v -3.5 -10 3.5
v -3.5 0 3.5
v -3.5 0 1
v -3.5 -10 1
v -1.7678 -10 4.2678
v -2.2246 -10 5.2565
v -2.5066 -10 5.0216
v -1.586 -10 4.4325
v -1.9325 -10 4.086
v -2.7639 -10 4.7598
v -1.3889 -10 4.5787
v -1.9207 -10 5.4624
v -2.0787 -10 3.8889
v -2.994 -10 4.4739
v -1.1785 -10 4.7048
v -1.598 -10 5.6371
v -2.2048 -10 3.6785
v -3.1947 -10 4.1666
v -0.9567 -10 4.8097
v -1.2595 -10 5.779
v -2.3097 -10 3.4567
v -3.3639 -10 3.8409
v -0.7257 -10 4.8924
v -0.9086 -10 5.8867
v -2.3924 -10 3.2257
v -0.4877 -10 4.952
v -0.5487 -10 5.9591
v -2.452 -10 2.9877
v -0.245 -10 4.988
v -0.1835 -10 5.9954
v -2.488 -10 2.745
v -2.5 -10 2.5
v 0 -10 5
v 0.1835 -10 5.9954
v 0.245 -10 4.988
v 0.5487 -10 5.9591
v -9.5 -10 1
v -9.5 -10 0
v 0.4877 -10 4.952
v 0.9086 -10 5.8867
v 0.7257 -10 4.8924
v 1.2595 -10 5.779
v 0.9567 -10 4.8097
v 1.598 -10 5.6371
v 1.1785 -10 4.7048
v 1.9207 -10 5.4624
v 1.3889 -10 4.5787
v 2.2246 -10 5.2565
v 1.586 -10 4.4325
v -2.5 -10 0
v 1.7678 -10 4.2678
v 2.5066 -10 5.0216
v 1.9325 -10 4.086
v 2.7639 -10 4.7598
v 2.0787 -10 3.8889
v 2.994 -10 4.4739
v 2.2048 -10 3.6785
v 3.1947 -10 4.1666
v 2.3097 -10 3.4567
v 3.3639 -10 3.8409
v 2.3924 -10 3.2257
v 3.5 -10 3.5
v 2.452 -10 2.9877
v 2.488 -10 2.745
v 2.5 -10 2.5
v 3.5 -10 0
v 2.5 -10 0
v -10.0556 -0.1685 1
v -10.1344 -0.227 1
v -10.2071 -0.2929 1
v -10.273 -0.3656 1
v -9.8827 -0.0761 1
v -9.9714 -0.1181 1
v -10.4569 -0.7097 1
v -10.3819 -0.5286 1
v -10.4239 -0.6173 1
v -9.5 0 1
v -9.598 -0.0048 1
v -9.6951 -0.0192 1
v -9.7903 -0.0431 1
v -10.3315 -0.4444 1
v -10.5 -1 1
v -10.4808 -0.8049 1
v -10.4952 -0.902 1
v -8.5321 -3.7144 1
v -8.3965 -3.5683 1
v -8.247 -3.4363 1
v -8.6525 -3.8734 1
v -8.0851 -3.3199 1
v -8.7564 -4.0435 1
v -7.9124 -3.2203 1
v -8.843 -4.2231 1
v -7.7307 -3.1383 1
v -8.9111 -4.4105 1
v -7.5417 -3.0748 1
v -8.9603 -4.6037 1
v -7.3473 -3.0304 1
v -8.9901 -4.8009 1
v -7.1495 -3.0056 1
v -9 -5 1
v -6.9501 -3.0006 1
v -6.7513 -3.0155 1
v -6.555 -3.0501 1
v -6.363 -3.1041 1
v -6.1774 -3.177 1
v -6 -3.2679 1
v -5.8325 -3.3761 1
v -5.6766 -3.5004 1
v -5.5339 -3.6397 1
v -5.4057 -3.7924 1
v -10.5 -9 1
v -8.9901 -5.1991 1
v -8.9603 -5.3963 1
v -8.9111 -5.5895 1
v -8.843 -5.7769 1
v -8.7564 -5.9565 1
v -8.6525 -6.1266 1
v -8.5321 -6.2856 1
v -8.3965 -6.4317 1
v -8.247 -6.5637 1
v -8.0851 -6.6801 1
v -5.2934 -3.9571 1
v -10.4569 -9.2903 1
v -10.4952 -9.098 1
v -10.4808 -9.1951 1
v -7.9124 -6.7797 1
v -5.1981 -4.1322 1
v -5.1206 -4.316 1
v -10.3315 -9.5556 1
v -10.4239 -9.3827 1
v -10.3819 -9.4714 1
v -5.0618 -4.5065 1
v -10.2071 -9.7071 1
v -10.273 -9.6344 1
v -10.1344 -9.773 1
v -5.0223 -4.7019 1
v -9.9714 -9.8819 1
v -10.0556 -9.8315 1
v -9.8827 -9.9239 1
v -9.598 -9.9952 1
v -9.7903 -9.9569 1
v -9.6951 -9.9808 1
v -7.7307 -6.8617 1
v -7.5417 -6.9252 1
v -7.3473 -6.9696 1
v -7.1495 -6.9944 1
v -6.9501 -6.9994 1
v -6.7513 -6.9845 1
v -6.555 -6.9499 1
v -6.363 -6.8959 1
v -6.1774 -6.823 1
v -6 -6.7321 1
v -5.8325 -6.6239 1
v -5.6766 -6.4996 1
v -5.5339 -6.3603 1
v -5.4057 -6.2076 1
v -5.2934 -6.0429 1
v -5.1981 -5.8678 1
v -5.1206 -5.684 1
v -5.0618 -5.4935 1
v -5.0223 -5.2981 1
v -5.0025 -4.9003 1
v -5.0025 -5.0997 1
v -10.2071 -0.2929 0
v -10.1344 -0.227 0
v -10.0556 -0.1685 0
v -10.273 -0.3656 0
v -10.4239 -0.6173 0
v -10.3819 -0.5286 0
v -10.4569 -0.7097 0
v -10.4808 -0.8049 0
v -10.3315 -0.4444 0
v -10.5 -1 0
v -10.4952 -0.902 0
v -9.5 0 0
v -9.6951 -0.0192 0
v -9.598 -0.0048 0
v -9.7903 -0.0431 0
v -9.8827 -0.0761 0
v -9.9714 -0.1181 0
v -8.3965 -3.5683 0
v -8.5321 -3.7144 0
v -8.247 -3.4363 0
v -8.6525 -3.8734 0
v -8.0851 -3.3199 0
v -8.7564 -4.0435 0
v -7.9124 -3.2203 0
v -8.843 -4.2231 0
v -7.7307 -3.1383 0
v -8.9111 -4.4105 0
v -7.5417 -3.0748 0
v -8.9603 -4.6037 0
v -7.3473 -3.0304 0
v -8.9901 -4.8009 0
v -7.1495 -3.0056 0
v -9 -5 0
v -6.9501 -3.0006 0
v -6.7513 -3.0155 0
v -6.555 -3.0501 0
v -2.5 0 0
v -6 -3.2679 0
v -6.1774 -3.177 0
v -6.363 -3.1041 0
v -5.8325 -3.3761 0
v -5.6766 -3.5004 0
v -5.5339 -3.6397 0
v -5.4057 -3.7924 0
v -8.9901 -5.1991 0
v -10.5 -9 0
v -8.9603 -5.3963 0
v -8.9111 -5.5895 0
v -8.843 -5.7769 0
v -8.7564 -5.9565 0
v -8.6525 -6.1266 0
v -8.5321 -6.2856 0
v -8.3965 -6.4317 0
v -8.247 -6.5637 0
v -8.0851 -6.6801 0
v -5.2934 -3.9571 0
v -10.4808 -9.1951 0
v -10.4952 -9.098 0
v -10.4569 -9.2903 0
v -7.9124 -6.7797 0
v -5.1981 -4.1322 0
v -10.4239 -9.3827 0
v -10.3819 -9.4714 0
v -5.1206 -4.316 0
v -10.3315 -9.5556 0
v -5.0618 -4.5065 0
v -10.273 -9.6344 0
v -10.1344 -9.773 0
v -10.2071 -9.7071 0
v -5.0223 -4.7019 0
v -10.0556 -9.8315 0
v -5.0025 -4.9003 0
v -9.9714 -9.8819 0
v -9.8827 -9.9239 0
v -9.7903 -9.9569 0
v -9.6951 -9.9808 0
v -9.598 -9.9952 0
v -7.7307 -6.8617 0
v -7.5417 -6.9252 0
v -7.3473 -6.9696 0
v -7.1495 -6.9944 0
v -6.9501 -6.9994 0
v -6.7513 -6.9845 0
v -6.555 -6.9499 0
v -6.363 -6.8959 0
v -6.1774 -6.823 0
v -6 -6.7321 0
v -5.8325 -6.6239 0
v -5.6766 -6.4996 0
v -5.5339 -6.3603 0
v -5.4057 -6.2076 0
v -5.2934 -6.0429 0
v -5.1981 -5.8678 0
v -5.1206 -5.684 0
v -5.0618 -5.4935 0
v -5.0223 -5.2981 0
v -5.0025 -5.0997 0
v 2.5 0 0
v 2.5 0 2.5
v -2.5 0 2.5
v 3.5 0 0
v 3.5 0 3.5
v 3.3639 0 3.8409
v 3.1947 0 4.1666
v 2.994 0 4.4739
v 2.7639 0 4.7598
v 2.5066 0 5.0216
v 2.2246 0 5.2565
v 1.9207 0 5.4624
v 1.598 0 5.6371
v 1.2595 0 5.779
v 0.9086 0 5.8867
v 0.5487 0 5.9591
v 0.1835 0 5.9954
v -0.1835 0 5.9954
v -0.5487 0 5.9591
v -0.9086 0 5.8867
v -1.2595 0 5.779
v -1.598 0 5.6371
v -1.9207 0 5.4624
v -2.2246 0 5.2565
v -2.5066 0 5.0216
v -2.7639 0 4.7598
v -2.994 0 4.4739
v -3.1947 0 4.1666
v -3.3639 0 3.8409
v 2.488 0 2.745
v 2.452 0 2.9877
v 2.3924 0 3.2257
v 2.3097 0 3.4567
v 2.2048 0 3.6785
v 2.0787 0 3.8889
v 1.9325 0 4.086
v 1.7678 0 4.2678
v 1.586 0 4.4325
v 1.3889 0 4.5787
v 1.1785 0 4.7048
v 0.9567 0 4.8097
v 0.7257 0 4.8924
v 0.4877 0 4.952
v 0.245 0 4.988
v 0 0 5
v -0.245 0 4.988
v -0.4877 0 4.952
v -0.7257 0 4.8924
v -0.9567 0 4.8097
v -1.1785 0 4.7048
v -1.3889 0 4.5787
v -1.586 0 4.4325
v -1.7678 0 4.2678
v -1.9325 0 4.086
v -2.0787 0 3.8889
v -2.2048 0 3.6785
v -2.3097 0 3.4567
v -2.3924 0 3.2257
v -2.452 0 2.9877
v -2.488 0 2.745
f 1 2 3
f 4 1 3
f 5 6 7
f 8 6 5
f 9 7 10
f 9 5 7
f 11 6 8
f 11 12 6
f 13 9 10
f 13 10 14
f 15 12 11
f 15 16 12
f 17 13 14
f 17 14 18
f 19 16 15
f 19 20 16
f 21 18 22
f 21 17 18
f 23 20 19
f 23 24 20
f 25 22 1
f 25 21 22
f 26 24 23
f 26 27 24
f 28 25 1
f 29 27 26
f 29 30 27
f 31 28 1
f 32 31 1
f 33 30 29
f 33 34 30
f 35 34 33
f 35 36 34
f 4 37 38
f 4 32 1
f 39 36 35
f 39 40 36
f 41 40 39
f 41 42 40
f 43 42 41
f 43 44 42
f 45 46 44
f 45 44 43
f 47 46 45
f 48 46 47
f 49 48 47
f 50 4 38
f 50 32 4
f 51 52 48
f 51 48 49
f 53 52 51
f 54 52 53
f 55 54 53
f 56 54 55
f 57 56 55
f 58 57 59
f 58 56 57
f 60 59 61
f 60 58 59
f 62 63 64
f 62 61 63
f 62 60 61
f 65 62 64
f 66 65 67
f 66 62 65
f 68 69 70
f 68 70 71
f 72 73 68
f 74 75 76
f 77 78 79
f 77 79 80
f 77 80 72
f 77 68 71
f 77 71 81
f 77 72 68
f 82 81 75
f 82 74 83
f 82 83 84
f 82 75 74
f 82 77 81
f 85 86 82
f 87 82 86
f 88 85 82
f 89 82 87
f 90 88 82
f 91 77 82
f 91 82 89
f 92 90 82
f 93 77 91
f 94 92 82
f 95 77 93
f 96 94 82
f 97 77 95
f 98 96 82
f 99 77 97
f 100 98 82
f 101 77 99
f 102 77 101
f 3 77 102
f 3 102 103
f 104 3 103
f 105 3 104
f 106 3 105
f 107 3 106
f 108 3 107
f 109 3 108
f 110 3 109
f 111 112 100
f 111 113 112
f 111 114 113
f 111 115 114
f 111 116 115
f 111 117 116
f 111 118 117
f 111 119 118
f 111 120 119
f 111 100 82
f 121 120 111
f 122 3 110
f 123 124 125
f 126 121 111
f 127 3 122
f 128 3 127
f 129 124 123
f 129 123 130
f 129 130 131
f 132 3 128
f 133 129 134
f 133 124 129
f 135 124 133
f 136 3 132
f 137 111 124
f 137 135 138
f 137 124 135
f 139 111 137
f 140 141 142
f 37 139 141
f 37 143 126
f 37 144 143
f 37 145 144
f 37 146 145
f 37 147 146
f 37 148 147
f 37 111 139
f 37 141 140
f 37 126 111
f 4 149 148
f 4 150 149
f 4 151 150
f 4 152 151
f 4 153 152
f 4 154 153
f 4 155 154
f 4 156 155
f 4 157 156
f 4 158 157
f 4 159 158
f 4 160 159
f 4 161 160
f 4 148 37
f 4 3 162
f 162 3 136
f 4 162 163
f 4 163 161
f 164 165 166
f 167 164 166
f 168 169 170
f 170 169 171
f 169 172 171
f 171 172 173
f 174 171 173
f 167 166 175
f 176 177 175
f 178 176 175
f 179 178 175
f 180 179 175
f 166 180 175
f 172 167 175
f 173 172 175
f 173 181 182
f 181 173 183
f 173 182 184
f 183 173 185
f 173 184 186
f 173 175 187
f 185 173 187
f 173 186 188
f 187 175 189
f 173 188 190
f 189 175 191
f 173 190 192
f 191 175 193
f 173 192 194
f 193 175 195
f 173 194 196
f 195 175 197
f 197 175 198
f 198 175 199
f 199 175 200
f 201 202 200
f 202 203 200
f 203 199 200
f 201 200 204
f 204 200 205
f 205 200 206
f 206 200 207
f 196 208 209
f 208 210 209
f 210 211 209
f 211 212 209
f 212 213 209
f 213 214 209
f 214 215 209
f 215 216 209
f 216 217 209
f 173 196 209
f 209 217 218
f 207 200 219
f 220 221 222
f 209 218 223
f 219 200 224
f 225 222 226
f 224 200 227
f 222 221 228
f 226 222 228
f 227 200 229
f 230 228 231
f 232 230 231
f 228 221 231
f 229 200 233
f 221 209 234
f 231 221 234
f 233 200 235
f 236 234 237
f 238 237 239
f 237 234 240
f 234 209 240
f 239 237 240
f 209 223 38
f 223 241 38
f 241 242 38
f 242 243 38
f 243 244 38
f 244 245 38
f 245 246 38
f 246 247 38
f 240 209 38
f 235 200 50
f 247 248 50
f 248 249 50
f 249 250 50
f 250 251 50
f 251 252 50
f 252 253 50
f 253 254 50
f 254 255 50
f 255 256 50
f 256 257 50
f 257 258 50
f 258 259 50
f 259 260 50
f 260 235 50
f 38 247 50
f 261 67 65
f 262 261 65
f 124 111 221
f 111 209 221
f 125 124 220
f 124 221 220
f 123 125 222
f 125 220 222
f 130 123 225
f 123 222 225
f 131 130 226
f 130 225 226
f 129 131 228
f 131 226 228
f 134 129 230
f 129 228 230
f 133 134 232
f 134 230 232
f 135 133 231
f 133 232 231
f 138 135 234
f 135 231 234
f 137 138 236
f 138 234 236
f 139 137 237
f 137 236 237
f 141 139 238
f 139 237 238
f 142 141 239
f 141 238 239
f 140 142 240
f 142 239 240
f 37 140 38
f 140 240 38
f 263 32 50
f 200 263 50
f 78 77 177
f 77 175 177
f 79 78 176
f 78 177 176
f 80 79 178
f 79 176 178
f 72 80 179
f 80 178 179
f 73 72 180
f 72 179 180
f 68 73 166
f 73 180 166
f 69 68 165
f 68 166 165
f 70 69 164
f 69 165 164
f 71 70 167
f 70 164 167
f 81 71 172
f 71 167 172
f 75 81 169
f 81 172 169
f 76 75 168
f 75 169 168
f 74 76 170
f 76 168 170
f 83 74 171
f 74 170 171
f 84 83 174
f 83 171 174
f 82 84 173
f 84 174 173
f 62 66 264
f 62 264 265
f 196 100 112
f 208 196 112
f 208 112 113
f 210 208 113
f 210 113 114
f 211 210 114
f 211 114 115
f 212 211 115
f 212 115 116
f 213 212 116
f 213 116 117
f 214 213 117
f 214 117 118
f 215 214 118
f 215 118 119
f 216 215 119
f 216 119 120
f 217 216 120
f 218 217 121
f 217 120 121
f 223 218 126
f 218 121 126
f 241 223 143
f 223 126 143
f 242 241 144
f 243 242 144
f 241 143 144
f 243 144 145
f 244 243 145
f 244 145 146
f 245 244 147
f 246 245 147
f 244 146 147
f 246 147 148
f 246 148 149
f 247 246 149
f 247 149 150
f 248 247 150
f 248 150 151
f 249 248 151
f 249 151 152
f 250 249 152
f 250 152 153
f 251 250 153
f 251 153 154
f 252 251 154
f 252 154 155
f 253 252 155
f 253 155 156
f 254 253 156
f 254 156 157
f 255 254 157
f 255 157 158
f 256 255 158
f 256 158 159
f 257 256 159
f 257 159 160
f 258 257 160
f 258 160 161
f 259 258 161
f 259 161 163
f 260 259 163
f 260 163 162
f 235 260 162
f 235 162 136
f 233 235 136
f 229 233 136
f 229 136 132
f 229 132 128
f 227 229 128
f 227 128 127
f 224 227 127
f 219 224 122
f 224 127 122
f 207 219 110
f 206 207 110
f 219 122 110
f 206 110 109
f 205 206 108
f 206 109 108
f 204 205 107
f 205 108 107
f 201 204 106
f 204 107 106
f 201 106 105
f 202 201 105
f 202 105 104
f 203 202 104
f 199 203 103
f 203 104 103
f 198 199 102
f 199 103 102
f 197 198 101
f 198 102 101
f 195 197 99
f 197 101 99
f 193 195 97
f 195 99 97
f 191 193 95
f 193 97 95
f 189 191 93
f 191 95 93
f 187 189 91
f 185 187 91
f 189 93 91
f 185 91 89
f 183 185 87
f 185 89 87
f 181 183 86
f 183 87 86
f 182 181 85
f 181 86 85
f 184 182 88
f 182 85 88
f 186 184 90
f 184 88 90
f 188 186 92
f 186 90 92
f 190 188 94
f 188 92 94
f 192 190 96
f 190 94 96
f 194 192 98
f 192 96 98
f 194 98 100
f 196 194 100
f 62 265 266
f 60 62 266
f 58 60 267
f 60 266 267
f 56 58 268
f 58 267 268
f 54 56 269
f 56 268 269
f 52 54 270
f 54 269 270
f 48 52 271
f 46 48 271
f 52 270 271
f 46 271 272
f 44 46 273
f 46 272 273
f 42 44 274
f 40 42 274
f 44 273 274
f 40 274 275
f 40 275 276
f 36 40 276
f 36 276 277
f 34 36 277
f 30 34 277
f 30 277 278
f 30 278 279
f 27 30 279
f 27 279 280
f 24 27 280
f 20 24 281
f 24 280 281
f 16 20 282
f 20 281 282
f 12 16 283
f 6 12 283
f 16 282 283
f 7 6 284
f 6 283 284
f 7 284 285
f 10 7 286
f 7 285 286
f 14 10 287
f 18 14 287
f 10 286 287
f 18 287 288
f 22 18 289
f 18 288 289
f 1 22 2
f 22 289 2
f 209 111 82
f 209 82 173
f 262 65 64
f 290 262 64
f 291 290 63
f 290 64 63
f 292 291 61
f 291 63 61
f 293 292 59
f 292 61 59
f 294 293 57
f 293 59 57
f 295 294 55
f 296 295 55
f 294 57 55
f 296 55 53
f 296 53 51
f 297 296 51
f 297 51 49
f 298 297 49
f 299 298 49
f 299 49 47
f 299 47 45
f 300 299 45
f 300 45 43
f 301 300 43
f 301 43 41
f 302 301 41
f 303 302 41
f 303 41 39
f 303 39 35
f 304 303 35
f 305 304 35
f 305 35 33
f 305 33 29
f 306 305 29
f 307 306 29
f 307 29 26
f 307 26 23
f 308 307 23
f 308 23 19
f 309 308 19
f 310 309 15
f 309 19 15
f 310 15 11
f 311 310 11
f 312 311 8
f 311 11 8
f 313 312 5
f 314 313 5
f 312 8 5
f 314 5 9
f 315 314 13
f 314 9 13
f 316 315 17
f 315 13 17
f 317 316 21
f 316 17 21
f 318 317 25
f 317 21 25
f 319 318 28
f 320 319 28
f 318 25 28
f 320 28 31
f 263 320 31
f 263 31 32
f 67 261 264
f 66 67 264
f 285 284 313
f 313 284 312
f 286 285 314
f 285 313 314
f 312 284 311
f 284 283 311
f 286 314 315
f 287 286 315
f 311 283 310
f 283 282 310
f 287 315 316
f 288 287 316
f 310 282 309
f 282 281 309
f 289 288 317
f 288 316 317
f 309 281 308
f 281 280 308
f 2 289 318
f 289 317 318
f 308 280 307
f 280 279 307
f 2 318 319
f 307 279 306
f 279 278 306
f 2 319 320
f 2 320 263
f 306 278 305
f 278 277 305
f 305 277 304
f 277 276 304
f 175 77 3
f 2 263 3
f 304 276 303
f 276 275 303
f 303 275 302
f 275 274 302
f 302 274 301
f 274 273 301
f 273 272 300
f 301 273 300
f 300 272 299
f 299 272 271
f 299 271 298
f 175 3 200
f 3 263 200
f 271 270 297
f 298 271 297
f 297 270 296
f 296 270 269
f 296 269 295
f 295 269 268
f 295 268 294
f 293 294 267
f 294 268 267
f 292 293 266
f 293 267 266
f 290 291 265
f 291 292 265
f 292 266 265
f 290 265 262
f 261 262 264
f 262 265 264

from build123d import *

# Parameters (mm, degrees)
PAD_DEPTH       = 10
POCKET_DEPTH    = 10.001
SKETCH002_W     = 1
SKETCH002_H     = 10
PAD001_DEPTH    = 7
SKETCH003_R     = 2
POCKET001_DEPTH = 5
FILLET_R        = 1


with BuildPart() as part:
    # Sketch → Pad (new body)
    with BuildSketch(Plane.XZ):
        with BuildLine():
            ThreePointArc((3.5, 3.5), (0, 6), (-3.5, 3.5))
            Line((-3.5, 3.5), (-3.5, 0))
            Line((-3.5, 0), (3.5, 0))
            Line((3.5, 0), (3.5, 3.5))
        make_face()
    extrude(amount=PAD_DEPTH)

    # Sketch001 (on Face6 of Pad) → Pocket (cut, through all)
    with BuildSketch(Plane.XZ.offset(10)):
        with BuildLine():
            ThreePointArc((2.5, 2.5), (0, 5), (-2.5, 2.5))
            Line((-2.5, 2.5), (-2.5, 0))
            Line((-2.5, 0), (2.5, 0))
            Line((2.5, 0), (2.5, 2.5))
        make_face()
    extrude(amount=-POCKET_DEPTH, mode=Mode.SUBTRACT)

    # Sketch002 (on Face3 of Pocket) → Pad001 (join)
    with BuildSketch(Plane(origin=(-3.5, 0, 0), x_dir=(0, 0, -1), z_dir=(-1, 0, 0))):
        with Locations((-0.5, 5)):
            Rectangle(SKETCH002_W, SKETCH002_H)
    extrude(amount=PAD001_DEPTH)

    # Sketch003 (on Face7 of Pad001) → Pocket001 (cut)
    with BuildSketch(Plane(origin=(0, 0, 1), x_dir=(-1, 0, 0), z_dir=(0, 0, 1))):
        with Locations((7, 5)):
            Circle(SKETCH003_R)
    extrude(amount=-POCKET001_DEPTH, mode=Mode.SUBTRACT)

    # Fillet
    fillet_edges = [part.edges().sort_by_distance(p)[0] for p in [
        (-10.5, -10, 0.5),
        (-10.5, 0, 0.5),
    ]]
    fillet(fillet_edges, radius=FILLET_R)


solid = part.part
